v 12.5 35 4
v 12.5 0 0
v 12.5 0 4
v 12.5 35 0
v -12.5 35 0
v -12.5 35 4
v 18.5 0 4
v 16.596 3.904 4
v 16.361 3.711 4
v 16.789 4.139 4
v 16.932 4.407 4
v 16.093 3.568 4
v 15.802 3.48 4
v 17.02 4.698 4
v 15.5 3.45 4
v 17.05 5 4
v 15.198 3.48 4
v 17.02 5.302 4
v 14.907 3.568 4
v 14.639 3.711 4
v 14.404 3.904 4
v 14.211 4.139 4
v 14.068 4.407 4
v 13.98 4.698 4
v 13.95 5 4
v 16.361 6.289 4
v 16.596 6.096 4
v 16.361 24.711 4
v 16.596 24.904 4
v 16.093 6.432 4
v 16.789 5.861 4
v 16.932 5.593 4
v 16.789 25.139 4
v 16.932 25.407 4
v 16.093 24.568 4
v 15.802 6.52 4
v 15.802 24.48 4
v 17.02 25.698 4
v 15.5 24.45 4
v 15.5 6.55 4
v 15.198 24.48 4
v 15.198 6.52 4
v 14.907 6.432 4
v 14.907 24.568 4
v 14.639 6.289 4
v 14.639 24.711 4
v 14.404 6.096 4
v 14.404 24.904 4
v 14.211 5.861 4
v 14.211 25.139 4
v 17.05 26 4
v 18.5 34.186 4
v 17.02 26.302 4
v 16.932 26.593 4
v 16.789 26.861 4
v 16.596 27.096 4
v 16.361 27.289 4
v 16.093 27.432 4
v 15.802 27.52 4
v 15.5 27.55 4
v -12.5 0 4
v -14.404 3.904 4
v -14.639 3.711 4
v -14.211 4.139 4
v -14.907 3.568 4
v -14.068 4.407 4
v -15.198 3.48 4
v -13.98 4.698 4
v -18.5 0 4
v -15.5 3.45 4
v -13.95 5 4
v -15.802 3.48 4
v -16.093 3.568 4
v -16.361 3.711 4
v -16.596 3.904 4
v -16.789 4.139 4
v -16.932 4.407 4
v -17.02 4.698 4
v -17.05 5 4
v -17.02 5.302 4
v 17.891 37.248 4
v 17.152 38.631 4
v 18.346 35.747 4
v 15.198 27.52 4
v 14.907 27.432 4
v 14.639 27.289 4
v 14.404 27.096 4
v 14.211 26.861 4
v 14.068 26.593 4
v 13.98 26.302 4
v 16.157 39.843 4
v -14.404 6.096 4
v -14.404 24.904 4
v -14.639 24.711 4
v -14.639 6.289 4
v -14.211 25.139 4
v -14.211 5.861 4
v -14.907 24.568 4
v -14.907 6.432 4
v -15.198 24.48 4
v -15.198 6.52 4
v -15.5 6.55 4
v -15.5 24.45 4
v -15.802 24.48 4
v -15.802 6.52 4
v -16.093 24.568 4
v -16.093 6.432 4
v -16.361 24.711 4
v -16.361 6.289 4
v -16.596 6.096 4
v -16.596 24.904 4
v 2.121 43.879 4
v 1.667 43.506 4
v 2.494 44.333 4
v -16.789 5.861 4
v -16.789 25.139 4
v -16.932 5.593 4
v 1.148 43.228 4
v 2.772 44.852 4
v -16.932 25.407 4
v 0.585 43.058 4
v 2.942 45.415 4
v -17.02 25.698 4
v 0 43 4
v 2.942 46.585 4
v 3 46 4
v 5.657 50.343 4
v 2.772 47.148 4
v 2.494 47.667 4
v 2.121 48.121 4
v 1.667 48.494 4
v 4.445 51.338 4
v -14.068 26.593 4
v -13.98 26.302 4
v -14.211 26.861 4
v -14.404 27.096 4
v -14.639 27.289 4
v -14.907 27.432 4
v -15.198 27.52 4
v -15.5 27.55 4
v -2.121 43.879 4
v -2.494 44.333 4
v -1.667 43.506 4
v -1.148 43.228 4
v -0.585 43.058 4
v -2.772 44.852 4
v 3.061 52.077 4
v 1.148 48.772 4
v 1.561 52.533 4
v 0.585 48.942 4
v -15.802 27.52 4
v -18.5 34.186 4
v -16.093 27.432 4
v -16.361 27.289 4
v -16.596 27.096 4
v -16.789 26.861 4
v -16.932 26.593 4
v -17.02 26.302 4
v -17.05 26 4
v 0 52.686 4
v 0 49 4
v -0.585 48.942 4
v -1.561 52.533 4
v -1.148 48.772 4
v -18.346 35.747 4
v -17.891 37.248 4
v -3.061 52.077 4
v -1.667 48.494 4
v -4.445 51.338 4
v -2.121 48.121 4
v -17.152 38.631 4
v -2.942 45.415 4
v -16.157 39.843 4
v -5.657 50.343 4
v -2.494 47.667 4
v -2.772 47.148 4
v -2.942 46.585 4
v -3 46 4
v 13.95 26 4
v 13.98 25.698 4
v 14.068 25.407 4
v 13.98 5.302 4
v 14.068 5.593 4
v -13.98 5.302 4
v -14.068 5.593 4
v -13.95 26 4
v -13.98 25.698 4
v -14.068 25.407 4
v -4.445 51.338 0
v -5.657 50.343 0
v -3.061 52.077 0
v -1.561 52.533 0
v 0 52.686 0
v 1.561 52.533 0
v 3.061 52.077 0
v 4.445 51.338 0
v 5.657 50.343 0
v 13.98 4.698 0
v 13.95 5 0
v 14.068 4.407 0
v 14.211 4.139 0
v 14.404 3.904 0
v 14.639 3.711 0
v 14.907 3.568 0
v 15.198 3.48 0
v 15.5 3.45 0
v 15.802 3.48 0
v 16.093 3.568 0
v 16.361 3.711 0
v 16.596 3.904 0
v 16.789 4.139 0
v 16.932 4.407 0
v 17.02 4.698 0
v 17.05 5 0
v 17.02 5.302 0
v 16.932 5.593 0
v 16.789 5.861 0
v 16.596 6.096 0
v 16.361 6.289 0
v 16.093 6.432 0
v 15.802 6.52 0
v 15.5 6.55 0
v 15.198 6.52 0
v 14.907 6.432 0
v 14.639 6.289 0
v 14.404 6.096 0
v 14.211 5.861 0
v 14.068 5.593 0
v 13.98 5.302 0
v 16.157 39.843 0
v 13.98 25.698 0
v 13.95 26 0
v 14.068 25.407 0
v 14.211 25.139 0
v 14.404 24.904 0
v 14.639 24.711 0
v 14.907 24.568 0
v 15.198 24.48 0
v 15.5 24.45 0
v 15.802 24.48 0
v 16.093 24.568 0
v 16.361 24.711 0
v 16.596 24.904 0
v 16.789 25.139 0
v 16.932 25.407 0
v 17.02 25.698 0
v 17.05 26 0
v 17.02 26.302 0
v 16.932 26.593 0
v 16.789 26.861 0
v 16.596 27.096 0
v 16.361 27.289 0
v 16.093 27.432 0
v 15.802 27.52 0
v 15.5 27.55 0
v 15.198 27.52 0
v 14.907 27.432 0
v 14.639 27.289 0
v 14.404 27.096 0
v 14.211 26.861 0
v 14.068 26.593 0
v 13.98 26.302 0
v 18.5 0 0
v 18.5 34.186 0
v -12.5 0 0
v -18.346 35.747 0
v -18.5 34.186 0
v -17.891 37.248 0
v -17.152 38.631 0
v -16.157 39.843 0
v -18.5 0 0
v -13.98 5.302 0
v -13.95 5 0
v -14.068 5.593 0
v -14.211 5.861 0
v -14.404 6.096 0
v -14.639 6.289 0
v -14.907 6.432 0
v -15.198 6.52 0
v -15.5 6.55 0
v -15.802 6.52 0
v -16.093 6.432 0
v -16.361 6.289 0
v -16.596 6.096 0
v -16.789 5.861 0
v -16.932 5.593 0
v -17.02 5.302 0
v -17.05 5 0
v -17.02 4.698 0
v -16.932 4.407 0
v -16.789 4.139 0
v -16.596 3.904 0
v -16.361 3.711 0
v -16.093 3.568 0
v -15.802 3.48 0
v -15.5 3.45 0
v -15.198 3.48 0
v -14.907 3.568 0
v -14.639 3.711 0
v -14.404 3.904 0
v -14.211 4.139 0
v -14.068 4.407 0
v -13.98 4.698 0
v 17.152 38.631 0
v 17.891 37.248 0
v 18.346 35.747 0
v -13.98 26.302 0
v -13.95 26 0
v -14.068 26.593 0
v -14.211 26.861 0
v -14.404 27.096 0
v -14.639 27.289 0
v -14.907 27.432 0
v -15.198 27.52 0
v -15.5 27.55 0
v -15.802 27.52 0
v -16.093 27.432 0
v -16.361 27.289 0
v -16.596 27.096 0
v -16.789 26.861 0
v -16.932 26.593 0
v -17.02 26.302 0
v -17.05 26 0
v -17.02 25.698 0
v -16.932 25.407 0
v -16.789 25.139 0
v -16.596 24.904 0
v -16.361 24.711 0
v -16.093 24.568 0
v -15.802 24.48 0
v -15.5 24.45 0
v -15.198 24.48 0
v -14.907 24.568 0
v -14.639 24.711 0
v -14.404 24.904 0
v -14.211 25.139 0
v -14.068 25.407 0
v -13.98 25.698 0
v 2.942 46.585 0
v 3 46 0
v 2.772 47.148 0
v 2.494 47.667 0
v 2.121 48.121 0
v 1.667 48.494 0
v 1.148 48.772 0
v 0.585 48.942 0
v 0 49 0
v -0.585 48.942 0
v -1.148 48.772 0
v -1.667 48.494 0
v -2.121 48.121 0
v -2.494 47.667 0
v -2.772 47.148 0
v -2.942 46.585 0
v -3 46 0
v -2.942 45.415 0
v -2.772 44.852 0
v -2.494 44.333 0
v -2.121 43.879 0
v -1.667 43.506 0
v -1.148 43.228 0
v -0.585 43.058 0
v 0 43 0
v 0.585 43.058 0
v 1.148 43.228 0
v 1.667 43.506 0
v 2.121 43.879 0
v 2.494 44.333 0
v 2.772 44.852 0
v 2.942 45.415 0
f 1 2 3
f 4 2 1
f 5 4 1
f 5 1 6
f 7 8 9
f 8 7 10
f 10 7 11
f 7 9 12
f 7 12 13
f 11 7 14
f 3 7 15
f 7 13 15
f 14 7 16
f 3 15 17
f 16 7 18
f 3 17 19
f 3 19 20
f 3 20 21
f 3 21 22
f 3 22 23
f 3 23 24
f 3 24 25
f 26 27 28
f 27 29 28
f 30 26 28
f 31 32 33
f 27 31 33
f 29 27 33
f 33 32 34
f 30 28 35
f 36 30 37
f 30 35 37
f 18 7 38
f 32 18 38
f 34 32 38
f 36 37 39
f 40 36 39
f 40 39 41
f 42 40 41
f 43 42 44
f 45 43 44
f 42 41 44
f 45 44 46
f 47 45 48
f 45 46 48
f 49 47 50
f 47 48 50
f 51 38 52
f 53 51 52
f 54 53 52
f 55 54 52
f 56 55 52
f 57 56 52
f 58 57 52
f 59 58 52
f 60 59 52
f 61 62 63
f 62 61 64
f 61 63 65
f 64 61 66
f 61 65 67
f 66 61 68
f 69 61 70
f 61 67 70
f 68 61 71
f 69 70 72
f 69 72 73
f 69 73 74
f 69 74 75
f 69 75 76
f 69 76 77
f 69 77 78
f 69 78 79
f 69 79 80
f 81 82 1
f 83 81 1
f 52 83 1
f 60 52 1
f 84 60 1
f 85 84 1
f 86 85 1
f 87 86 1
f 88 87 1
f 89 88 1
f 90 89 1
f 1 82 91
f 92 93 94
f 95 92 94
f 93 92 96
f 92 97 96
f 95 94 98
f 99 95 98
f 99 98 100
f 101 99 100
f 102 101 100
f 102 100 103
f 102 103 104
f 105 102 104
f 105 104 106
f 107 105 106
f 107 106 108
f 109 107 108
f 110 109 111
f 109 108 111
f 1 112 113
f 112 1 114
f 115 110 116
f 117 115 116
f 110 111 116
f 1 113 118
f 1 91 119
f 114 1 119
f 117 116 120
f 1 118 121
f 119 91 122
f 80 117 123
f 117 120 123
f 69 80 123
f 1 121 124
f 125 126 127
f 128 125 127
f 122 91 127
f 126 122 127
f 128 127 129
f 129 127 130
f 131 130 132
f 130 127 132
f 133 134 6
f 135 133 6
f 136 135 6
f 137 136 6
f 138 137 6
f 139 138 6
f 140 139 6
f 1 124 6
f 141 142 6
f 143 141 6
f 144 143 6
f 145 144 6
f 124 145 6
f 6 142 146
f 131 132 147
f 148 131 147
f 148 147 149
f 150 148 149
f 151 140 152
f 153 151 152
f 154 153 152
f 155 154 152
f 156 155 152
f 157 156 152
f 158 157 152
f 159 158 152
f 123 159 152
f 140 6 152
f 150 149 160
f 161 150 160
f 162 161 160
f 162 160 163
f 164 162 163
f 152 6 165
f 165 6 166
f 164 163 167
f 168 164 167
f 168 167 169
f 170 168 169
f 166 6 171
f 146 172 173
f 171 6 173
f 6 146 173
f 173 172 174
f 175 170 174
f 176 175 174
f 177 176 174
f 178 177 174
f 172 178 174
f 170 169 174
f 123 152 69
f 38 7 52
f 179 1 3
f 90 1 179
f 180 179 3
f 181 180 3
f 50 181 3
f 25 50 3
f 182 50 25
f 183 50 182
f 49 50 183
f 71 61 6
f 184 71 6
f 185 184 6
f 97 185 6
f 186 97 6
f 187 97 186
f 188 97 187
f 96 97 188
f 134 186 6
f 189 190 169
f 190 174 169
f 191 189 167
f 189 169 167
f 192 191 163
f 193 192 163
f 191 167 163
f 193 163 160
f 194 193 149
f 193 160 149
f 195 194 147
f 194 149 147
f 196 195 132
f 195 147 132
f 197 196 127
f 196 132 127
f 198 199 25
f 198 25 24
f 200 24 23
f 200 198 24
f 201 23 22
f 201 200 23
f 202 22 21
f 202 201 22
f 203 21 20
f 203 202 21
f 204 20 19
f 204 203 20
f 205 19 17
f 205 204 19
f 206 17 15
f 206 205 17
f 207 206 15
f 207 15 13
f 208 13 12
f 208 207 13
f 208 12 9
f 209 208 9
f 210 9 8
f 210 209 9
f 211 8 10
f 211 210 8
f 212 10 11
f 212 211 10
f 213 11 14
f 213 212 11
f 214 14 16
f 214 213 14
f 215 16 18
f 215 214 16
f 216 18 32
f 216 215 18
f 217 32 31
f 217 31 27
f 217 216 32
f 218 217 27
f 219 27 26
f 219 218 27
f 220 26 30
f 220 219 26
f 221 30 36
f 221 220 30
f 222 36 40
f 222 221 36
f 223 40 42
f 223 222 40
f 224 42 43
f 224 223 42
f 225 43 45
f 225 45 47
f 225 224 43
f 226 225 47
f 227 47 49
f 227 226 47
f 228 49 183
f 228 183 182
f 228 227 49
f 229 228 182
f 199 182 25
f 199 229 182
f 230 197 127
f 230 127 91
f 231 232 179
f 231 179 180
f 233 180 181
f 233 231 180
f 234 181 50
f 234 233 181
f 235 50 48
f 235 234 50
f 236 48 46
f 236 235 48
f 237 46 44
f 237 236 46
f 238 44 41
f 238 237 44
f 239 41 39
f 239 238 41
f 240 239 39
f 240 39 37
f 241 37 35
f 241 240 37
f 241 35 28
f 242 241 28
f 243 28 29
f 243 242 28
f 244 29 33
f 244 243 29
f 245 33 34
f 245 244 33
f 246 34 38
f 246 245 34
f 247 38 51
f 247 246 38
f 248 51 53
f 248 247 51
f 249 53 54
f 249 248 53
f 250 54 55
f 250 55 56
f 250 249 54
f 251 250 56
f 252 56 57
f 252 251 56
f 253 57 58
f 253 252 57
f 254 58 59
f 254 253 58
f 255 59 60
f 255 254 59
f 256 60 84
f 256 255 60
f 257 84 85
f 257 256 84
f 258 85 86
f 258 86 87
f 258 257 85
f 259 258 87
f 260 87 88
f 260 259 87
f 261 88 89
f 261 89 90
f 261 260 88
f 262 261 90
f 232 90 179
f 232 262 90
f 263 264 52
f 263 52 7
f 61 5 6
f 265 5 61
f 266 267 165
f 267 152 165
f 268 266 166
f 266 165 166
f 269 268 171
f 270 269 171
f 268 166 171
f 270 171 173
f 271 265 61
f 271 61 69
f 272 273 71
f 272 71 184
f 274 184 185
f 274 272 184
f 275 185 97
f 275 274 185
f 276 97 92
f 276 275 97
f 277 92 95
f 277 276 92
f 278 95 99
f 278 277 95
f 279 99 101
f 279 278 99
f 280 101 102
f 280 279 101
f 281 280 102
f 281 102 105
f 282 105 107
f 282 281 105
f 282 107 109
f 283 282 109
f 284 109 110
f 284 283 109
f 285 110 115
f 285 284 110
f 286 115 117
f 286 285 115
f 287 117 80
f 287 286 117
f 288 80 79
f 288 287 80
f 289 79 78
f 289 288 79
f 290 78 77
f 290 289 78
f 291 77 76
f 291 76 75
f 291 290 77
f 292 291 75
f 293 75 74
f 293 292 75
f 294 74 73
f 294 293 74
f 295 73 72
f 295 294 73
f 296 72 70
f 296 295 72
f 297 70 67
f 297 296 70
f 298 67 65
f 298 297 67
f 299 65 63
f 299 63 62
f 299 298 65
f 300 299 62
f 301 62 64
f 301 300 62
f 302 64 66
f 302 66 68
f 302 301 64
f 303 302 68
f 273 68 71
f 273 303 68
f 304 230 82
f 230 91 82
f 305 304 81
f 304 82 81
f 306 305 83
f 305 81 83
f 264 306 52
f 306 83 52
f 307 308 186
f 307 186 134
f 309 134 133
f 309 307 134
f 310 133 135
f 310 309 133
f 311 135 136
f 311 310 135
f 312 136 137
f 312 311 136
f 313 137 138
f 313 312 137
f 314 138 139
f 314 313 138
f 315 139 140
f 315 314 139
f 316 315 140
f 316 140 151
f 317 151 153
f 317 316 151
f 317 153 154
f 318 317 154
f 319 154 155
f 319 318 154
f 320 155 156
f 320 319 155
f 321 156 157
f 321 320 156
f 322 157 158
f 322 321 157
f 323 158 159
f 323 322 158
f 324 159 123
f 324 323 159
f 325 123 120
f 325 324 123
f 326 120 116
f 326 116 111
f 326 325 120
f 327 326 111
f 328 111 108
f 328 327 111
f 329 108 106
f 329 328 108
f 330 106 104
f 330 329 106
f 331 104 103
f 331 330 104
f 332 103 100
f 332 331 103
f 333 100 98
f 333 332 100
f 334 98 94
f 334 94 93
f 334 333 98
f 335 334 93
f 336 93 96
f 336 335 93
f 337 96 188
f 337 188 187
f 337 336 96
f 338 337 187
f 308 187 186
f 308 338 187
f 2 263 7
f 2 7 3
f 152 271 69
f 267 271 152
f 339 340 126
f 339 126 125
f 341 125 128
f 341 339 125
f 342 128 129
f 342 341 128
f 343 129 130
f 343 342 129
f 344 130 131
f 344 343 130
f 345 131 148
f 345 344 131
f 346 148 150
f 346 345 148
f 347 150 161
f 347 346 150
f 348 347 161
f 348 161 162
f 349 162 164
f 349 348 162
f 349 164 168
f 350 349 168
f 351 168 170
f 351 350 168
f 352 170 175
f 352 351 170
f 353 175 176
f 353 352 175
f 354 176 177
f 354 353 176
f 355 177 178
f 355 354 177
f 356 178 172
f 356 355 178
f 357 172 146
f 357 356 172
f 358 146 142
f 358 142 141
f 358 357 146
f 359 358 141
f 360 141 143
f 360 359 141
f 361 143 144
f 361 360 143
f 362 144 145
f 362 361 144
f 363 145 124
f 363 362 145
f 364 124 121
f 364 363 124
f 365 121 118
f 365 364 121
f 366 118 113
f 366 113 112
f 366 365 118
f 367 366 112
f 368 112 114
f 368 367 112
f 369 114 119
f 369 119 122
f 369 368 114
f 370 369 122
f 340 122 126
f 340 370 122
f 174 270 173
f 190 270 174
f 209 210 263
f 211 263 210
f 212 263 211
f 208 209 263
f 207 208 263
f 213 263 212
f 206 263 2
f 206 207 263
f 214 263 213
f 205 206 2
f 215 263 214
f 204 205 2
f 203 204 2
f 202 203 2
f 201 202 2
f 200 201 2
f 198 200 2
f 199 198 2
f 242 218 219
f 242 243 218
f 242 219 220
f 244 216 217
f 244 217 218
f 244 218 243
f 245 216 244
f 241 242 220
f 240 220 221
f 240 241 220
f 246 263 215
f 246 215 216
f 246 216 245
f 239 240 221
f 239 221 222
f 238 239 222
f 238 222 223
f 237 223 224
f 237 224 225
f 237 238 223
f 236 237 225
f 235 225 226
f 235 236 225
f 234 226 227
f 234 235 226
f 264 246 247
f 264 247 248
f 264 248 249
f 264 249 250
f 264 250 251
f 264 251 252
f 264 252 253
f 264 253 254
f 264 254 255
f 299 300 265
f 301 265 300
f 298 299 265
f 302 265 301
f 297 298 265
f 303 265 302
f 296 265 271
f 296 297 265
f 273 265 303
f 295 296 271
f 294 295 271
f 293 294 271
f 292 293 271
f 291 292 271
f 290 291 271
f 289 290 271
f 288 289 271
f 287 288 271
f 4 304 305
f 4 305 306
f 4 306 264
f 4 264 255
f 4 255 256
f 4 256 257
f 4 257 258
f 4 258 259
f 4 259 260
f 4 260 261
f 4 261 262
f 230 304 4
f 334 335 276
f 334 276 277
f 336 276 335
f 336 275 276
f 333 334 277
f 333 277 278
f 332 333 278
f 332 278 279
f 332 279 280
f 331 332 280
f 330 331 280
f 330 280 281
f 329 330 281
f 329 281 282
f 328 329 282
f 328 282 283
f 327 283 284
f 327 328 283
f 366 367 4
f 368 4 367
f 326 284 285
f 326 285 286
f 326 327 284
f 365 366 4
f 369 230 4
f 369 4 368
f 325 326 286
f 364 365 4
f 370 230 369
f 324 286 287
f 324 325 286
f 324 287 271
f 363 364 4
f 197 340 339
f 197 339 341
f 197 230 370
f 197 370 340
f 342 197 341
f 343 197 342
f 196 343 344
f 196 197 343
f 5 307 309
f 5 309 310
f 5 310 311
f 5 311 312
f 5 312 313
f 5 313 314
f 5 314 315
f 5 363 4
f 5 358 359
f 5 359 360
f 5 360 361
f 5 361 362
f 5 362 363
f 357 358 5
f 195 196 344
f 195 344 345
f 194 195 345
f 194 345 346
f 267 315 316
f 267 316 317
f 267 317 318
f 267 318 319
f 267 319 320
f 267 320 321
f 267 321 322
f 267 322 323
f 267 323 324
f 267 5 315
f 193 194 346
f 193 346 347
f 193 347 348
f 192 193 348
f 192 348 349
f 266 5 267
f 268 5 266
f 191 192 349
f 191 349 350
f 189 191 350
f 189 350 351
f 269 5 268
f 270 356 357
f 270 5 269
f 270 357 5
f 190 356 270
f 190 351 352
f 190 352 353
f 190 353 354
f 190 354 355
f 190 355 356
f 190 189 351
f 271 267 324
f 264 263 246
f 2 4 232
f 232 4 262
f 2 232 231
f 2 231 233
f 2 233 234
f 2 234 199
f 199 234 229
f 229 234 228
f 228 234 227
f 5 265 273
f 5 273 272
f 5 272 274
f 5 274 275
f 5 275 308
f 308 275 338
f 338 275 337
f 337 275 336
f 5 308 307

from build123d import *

# Parameters (mm, degrees)
SKETCH_1_R      = 3
SKETCH_1_R_2    = 1.55
EXTRUDE_1_DEPTH = 4
FILLET_1_R      = 8


with BuildPart() as part:
    # 草图1 → 凸台-拉伸1 (new body)
    with BuildSketch(Plane.XY):
        Polygon((-12.5, 0), (-18.5, 0), (-18.5, 37.5), (0, 56), (18.5, 37.5), (18.5, 0), (12.5, 0), (12.5, 35), (-12.5, 35), align=None)
        with Locations((0, 46)):
            Circle(SKETCH_1_R, mode=Mode.SUBTRACT)
        with Locations((-15.5, 5)):
            Circle(SKETCH_1_R_2, mode=Mode.SUBTRACT)
        with Locations((-15.5, 26)):
            Circle(SKETCH_1_R_2, mode=Mode.SUBTRACT)
        with Locations(Location((15.5, 5, 0), (0, 0, 180))):
            Circle(SKETCH_1_R_2, mode=Mode.SUBTRACT)
        with Locations(Location((15.5, 26, 0), (0, 0, 180))):
            Circle(SKETCH_1_R_2, mode=Mode.SUBTRACT)
    extrude(amount=EXTRUDE_1_DEPTH)

    # 圆角1
    fillet_1_edges = [part.edges().sort_by_distance(p)[0] for p in [
        (-18.5, 37.5, 2),
        (0, 56, 2),
        (18.5, 37.5, 2),
    ]]
    fillet(fillet_1_edges, radius=FILLET_1_R)


solid = part.part
